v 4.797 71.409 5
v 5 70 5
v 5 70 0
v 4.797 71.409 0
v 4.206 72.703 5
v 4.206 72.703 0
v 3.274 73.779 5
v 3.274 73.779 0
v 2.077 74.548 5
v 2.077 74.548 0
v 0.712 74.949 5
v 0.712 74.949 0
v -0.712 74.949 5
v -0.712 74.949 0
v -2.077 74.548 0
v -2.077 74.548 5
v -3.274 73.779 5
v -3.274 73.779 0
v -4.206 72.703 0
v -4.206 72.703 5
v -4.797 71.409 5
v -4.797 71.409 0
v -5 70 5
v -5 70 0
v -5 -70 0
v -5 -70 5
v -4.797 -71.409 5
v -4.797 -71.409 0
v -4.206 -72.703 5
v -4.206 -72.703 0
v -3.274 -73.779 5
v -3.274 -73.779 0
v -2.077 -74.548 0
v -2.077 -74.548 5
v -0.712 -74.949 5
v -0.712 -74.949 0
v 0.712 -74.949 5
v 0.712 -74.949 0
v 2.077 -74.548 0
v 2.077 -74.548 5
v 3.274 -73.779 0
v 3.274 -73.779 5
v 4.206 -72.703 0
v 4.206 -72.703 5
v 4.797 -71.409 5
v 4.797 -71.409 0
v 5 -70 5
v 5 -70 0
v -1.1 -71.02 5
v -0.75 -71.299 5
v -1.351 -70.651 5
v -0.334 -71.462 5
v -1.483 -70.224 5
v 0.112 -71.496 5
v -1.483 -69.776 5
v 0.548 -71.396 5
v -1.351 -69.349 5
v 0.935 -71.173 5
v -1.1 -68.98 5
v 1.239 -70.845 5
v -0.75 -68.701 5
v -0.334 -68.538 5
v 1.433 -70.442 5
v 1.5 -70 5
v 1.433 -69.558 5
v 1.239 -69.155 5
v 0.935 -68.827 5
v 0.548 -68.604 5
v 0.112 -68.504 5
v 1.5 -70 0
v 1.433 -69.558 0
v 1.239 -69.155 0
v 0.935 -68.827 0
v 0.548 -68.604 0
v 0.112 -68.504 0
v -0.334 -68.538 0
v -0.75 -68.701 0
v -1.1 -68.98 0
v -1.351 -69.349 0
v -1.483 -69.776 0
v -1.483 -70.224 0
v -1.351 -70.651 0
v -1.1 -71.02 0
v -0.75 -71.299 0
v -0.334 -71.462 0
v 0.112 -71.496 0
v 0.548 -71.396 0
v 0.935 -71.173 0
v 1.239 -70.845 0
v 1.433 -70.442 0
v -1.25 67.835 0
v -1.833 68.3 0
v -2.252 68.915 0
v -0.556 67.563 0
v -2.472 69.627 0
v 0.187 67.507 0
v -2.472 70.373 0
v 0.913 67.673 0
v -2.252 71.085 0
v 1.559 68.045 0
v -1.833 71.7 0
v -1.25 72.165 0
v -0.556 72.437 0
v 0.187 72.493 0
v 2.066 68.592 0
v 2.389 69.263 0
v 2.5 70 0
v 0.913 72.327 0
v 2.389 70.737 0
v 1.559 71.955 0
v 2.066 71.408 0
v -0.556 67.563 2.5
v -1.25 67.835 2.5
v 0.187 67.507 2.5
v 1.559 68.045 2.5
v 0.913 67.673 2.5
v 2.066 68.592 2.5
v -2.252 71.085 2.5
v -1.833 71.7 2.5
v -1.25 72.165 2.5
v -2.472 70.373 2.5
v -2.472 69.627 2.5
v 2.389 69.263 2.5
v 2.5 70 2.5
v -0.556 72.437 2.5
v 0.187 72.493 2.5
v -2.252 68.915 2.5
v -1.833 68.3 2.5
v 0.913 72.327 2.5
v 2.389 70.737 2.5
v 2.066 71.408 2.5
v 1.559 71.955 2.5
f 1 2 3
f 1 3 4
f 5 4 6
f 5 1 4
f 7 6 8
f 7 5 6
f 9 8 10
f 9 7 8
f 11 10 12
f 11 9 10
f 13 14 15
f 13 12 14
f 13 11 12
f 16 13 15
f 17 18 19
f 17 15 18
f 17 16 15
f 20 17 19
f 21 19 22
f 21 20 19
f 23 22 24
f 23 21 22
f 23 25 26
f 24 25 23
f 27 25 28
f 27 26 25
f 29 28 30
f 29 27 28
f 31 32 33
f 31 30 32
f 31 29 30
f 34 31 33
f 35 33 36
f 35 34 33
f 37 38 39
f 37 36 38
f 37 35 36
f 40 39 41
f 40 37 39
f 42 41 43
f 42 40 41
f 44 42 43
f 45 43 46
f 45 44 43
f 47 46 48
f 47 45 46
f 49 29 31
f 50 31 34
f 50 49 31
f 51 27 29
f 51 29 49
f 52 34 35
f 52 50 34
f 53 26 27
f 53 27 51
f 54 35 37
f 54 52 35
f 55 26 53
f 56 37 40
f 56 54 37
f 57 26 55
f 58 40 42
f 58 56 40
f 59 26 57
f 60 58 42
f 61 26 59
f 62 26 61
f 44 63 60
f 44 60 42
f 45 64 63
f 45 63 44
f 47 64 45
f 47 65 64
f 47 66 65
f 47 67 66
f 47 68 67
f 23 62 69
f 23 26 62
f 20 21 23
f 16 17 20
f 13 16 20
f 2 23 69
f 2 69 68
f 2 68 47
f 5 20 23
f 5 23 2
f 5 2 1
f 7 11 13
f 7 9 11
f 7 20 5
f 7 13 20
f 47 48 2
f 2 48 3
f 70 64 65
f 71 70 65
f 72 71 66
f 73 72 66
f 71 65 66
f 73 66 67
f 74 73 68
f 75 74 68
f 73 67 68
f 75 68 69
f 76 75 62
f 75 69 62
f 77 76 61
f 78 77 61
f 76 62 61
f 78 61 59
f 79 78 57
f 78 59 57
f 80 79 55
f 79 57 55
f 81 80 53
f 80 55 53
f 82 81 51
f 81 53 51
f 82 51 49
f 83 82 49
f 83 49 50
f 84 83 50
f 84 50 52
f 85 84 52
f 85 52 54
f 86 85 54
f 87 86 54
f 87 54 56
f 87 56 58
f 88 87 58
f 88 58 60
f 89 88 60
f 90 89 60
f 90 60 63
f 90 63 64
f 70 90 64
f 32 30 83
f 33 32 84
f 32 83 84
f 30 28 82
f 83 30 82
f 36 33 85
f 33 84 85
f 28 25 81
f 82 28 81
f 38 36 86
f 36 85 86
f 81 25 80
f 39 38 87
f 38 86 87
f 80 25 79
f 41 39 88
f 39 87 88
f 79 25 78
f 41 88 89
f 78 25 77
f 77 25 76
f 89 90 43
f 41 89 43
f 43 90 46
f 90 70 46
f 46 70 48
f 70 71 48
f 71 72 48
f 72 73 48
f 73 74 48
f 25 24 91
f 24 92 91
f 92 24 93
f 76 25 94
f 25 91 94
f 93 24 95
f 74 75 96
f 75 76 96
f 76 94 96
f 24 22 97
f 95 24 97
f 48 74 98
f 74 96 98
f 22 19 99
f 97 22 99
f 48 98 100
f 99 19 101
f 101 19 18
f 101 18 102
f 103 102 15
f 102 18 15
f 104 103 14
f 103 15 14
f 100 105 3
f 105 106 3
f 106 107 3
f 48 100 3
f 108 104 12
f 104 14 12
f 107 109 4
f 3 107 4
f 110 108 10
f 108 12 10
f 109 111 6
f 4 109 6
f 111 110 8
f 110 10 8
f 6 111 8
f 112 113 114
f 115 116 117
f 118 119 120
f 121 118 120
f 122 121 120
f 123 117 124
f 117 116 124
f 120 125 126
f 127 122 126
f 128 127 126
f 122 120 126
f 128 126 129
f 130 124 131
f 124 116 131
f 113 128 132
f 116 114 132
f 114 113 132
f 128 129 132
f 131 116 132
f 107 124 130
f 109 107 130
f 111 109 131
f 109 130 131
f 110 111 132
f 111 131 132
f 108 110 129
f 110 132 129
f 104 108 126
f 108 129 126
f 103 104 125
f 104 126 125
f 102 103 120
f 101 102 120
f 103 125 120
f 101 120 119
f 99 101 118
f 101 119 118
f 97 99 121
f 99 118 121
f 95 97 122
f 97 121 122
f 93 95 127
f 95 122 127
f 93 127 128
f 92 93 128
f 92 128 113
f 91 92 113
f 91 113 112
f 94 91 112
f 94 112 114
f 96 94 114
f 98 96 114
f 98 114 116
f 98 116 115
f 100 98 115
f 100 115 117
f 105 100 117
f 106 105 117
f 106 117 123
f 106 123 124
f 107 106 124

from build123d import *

# Parameters (mm, degrees)
ESQUISSE1_W             = 10
ESQUISSE1_H             = 150
BOSS_EXTRU_1_DEPTH      = 5
CONG_1_RADIUS           = 5
CONG_1_LENGTH           = 5
CONG_2_RADIUS           = 5
CONG_2_LENGTH           = 5
ESQUISSE2_R             = 2.5
ESQUISSE2_R_2           = 1.5
ENL_V_MAT_EXTRU_1_DEPTH = 76.332595867
ESQUISSE3_R             = 2.5
BOSS_EXTRU_2_DEPTH      = 2.5


with BuildPart() as part:
    # Esquisse1 → Boss.-Extru.1 (new body)
    with BuildSketch(Plane.XY):
        Rectangle(ESQUISSE1_W, ESQUISSE1_H)
    extrude(amount=BOSS_EXTRU_1_DEPTH)

    # Congé1: full round fillet: the end face becomes a half cylinder, R = half its width
    cong_1_face = Plane((0, 75, 2.5), x_dir=(0, 0, 1), z_dir=(0, 1, 0))  # on the end face: x along it, z out of the body
    cong_1_slab = cong_1_face.offset(-CONG_1_RADIUS / 2) * Box(CONG_1_LENGTH, 2 * CONG_1_RADIUS, CONG_1_RADIUS, mode=Mode.PRIVATE)  # the body's end, R deep
    cong_1_round = Plane((0, 70, 2.5), x_dir=(0, 1, 0), z_dir=(0, 0, 1)) * Cylinder(CONG_1_RADIUS, CONG_1_LENGTH, mode=Mode.PRIVATE)  # its axis R under the face
    add(cong_1_slab - cong_1_round, mode=Mode.SUBTRACT)

    # Congé2: full round fillet: the end face becomes a half cylinder, R = half its width
    cong_2_face = Plane((0, -75, 2.5), x_dir=(0, 0, 1), z_dir=(0, -1, 0))  # on the end face: x along it, z out of the body
    cong_2_slab = cong_2_face.offset(-CONG_2_RADIUS / 2) * Box(CONG_2_LENGTH, 2 * CONG_2_RADIUS, CONG_2_RADIUS, mode=Mode.PRIVATE)  # the body's end, R deep
    cong_2_round = Plane((0, -70, 2.5), x_dir=(0, -1, 0), z_dir=(0, 0, 1)) * Cylinder(CONG_2_RADIUS, CONG_2_LENGTH, mode=Mode.PRIVATE)  # its axis R under the face
    add(cong_2_slab - cong_2_round, mode=Mode.SUBTRACT)

    # Esquisse2 → Enlèv. mat.-Extru.1 (cut, through all)
    with BuildSketch(Plane.XY.offset(5)):
        with Locations((0, 70)):
            Circle(ESQUISSE2_R)
        with Locations((0, -70)):
            Circle(ESQUISSE2_R_2)
    extrude(amount=-ENL_V_MAT_EXTRU_1_DEPTH, mode=Mode.SUBTRACT)

    # Esquisse3 → Boss.-Extru.2 (add)
    with BuildSketch(Plane.XY.offset(5)):
        with Locations((0, 70)):
            Circle(ESQUISSE3_R)
    extrude(amount=-BOSS_EXTRU_2_DEPTH)


solid = part.part
